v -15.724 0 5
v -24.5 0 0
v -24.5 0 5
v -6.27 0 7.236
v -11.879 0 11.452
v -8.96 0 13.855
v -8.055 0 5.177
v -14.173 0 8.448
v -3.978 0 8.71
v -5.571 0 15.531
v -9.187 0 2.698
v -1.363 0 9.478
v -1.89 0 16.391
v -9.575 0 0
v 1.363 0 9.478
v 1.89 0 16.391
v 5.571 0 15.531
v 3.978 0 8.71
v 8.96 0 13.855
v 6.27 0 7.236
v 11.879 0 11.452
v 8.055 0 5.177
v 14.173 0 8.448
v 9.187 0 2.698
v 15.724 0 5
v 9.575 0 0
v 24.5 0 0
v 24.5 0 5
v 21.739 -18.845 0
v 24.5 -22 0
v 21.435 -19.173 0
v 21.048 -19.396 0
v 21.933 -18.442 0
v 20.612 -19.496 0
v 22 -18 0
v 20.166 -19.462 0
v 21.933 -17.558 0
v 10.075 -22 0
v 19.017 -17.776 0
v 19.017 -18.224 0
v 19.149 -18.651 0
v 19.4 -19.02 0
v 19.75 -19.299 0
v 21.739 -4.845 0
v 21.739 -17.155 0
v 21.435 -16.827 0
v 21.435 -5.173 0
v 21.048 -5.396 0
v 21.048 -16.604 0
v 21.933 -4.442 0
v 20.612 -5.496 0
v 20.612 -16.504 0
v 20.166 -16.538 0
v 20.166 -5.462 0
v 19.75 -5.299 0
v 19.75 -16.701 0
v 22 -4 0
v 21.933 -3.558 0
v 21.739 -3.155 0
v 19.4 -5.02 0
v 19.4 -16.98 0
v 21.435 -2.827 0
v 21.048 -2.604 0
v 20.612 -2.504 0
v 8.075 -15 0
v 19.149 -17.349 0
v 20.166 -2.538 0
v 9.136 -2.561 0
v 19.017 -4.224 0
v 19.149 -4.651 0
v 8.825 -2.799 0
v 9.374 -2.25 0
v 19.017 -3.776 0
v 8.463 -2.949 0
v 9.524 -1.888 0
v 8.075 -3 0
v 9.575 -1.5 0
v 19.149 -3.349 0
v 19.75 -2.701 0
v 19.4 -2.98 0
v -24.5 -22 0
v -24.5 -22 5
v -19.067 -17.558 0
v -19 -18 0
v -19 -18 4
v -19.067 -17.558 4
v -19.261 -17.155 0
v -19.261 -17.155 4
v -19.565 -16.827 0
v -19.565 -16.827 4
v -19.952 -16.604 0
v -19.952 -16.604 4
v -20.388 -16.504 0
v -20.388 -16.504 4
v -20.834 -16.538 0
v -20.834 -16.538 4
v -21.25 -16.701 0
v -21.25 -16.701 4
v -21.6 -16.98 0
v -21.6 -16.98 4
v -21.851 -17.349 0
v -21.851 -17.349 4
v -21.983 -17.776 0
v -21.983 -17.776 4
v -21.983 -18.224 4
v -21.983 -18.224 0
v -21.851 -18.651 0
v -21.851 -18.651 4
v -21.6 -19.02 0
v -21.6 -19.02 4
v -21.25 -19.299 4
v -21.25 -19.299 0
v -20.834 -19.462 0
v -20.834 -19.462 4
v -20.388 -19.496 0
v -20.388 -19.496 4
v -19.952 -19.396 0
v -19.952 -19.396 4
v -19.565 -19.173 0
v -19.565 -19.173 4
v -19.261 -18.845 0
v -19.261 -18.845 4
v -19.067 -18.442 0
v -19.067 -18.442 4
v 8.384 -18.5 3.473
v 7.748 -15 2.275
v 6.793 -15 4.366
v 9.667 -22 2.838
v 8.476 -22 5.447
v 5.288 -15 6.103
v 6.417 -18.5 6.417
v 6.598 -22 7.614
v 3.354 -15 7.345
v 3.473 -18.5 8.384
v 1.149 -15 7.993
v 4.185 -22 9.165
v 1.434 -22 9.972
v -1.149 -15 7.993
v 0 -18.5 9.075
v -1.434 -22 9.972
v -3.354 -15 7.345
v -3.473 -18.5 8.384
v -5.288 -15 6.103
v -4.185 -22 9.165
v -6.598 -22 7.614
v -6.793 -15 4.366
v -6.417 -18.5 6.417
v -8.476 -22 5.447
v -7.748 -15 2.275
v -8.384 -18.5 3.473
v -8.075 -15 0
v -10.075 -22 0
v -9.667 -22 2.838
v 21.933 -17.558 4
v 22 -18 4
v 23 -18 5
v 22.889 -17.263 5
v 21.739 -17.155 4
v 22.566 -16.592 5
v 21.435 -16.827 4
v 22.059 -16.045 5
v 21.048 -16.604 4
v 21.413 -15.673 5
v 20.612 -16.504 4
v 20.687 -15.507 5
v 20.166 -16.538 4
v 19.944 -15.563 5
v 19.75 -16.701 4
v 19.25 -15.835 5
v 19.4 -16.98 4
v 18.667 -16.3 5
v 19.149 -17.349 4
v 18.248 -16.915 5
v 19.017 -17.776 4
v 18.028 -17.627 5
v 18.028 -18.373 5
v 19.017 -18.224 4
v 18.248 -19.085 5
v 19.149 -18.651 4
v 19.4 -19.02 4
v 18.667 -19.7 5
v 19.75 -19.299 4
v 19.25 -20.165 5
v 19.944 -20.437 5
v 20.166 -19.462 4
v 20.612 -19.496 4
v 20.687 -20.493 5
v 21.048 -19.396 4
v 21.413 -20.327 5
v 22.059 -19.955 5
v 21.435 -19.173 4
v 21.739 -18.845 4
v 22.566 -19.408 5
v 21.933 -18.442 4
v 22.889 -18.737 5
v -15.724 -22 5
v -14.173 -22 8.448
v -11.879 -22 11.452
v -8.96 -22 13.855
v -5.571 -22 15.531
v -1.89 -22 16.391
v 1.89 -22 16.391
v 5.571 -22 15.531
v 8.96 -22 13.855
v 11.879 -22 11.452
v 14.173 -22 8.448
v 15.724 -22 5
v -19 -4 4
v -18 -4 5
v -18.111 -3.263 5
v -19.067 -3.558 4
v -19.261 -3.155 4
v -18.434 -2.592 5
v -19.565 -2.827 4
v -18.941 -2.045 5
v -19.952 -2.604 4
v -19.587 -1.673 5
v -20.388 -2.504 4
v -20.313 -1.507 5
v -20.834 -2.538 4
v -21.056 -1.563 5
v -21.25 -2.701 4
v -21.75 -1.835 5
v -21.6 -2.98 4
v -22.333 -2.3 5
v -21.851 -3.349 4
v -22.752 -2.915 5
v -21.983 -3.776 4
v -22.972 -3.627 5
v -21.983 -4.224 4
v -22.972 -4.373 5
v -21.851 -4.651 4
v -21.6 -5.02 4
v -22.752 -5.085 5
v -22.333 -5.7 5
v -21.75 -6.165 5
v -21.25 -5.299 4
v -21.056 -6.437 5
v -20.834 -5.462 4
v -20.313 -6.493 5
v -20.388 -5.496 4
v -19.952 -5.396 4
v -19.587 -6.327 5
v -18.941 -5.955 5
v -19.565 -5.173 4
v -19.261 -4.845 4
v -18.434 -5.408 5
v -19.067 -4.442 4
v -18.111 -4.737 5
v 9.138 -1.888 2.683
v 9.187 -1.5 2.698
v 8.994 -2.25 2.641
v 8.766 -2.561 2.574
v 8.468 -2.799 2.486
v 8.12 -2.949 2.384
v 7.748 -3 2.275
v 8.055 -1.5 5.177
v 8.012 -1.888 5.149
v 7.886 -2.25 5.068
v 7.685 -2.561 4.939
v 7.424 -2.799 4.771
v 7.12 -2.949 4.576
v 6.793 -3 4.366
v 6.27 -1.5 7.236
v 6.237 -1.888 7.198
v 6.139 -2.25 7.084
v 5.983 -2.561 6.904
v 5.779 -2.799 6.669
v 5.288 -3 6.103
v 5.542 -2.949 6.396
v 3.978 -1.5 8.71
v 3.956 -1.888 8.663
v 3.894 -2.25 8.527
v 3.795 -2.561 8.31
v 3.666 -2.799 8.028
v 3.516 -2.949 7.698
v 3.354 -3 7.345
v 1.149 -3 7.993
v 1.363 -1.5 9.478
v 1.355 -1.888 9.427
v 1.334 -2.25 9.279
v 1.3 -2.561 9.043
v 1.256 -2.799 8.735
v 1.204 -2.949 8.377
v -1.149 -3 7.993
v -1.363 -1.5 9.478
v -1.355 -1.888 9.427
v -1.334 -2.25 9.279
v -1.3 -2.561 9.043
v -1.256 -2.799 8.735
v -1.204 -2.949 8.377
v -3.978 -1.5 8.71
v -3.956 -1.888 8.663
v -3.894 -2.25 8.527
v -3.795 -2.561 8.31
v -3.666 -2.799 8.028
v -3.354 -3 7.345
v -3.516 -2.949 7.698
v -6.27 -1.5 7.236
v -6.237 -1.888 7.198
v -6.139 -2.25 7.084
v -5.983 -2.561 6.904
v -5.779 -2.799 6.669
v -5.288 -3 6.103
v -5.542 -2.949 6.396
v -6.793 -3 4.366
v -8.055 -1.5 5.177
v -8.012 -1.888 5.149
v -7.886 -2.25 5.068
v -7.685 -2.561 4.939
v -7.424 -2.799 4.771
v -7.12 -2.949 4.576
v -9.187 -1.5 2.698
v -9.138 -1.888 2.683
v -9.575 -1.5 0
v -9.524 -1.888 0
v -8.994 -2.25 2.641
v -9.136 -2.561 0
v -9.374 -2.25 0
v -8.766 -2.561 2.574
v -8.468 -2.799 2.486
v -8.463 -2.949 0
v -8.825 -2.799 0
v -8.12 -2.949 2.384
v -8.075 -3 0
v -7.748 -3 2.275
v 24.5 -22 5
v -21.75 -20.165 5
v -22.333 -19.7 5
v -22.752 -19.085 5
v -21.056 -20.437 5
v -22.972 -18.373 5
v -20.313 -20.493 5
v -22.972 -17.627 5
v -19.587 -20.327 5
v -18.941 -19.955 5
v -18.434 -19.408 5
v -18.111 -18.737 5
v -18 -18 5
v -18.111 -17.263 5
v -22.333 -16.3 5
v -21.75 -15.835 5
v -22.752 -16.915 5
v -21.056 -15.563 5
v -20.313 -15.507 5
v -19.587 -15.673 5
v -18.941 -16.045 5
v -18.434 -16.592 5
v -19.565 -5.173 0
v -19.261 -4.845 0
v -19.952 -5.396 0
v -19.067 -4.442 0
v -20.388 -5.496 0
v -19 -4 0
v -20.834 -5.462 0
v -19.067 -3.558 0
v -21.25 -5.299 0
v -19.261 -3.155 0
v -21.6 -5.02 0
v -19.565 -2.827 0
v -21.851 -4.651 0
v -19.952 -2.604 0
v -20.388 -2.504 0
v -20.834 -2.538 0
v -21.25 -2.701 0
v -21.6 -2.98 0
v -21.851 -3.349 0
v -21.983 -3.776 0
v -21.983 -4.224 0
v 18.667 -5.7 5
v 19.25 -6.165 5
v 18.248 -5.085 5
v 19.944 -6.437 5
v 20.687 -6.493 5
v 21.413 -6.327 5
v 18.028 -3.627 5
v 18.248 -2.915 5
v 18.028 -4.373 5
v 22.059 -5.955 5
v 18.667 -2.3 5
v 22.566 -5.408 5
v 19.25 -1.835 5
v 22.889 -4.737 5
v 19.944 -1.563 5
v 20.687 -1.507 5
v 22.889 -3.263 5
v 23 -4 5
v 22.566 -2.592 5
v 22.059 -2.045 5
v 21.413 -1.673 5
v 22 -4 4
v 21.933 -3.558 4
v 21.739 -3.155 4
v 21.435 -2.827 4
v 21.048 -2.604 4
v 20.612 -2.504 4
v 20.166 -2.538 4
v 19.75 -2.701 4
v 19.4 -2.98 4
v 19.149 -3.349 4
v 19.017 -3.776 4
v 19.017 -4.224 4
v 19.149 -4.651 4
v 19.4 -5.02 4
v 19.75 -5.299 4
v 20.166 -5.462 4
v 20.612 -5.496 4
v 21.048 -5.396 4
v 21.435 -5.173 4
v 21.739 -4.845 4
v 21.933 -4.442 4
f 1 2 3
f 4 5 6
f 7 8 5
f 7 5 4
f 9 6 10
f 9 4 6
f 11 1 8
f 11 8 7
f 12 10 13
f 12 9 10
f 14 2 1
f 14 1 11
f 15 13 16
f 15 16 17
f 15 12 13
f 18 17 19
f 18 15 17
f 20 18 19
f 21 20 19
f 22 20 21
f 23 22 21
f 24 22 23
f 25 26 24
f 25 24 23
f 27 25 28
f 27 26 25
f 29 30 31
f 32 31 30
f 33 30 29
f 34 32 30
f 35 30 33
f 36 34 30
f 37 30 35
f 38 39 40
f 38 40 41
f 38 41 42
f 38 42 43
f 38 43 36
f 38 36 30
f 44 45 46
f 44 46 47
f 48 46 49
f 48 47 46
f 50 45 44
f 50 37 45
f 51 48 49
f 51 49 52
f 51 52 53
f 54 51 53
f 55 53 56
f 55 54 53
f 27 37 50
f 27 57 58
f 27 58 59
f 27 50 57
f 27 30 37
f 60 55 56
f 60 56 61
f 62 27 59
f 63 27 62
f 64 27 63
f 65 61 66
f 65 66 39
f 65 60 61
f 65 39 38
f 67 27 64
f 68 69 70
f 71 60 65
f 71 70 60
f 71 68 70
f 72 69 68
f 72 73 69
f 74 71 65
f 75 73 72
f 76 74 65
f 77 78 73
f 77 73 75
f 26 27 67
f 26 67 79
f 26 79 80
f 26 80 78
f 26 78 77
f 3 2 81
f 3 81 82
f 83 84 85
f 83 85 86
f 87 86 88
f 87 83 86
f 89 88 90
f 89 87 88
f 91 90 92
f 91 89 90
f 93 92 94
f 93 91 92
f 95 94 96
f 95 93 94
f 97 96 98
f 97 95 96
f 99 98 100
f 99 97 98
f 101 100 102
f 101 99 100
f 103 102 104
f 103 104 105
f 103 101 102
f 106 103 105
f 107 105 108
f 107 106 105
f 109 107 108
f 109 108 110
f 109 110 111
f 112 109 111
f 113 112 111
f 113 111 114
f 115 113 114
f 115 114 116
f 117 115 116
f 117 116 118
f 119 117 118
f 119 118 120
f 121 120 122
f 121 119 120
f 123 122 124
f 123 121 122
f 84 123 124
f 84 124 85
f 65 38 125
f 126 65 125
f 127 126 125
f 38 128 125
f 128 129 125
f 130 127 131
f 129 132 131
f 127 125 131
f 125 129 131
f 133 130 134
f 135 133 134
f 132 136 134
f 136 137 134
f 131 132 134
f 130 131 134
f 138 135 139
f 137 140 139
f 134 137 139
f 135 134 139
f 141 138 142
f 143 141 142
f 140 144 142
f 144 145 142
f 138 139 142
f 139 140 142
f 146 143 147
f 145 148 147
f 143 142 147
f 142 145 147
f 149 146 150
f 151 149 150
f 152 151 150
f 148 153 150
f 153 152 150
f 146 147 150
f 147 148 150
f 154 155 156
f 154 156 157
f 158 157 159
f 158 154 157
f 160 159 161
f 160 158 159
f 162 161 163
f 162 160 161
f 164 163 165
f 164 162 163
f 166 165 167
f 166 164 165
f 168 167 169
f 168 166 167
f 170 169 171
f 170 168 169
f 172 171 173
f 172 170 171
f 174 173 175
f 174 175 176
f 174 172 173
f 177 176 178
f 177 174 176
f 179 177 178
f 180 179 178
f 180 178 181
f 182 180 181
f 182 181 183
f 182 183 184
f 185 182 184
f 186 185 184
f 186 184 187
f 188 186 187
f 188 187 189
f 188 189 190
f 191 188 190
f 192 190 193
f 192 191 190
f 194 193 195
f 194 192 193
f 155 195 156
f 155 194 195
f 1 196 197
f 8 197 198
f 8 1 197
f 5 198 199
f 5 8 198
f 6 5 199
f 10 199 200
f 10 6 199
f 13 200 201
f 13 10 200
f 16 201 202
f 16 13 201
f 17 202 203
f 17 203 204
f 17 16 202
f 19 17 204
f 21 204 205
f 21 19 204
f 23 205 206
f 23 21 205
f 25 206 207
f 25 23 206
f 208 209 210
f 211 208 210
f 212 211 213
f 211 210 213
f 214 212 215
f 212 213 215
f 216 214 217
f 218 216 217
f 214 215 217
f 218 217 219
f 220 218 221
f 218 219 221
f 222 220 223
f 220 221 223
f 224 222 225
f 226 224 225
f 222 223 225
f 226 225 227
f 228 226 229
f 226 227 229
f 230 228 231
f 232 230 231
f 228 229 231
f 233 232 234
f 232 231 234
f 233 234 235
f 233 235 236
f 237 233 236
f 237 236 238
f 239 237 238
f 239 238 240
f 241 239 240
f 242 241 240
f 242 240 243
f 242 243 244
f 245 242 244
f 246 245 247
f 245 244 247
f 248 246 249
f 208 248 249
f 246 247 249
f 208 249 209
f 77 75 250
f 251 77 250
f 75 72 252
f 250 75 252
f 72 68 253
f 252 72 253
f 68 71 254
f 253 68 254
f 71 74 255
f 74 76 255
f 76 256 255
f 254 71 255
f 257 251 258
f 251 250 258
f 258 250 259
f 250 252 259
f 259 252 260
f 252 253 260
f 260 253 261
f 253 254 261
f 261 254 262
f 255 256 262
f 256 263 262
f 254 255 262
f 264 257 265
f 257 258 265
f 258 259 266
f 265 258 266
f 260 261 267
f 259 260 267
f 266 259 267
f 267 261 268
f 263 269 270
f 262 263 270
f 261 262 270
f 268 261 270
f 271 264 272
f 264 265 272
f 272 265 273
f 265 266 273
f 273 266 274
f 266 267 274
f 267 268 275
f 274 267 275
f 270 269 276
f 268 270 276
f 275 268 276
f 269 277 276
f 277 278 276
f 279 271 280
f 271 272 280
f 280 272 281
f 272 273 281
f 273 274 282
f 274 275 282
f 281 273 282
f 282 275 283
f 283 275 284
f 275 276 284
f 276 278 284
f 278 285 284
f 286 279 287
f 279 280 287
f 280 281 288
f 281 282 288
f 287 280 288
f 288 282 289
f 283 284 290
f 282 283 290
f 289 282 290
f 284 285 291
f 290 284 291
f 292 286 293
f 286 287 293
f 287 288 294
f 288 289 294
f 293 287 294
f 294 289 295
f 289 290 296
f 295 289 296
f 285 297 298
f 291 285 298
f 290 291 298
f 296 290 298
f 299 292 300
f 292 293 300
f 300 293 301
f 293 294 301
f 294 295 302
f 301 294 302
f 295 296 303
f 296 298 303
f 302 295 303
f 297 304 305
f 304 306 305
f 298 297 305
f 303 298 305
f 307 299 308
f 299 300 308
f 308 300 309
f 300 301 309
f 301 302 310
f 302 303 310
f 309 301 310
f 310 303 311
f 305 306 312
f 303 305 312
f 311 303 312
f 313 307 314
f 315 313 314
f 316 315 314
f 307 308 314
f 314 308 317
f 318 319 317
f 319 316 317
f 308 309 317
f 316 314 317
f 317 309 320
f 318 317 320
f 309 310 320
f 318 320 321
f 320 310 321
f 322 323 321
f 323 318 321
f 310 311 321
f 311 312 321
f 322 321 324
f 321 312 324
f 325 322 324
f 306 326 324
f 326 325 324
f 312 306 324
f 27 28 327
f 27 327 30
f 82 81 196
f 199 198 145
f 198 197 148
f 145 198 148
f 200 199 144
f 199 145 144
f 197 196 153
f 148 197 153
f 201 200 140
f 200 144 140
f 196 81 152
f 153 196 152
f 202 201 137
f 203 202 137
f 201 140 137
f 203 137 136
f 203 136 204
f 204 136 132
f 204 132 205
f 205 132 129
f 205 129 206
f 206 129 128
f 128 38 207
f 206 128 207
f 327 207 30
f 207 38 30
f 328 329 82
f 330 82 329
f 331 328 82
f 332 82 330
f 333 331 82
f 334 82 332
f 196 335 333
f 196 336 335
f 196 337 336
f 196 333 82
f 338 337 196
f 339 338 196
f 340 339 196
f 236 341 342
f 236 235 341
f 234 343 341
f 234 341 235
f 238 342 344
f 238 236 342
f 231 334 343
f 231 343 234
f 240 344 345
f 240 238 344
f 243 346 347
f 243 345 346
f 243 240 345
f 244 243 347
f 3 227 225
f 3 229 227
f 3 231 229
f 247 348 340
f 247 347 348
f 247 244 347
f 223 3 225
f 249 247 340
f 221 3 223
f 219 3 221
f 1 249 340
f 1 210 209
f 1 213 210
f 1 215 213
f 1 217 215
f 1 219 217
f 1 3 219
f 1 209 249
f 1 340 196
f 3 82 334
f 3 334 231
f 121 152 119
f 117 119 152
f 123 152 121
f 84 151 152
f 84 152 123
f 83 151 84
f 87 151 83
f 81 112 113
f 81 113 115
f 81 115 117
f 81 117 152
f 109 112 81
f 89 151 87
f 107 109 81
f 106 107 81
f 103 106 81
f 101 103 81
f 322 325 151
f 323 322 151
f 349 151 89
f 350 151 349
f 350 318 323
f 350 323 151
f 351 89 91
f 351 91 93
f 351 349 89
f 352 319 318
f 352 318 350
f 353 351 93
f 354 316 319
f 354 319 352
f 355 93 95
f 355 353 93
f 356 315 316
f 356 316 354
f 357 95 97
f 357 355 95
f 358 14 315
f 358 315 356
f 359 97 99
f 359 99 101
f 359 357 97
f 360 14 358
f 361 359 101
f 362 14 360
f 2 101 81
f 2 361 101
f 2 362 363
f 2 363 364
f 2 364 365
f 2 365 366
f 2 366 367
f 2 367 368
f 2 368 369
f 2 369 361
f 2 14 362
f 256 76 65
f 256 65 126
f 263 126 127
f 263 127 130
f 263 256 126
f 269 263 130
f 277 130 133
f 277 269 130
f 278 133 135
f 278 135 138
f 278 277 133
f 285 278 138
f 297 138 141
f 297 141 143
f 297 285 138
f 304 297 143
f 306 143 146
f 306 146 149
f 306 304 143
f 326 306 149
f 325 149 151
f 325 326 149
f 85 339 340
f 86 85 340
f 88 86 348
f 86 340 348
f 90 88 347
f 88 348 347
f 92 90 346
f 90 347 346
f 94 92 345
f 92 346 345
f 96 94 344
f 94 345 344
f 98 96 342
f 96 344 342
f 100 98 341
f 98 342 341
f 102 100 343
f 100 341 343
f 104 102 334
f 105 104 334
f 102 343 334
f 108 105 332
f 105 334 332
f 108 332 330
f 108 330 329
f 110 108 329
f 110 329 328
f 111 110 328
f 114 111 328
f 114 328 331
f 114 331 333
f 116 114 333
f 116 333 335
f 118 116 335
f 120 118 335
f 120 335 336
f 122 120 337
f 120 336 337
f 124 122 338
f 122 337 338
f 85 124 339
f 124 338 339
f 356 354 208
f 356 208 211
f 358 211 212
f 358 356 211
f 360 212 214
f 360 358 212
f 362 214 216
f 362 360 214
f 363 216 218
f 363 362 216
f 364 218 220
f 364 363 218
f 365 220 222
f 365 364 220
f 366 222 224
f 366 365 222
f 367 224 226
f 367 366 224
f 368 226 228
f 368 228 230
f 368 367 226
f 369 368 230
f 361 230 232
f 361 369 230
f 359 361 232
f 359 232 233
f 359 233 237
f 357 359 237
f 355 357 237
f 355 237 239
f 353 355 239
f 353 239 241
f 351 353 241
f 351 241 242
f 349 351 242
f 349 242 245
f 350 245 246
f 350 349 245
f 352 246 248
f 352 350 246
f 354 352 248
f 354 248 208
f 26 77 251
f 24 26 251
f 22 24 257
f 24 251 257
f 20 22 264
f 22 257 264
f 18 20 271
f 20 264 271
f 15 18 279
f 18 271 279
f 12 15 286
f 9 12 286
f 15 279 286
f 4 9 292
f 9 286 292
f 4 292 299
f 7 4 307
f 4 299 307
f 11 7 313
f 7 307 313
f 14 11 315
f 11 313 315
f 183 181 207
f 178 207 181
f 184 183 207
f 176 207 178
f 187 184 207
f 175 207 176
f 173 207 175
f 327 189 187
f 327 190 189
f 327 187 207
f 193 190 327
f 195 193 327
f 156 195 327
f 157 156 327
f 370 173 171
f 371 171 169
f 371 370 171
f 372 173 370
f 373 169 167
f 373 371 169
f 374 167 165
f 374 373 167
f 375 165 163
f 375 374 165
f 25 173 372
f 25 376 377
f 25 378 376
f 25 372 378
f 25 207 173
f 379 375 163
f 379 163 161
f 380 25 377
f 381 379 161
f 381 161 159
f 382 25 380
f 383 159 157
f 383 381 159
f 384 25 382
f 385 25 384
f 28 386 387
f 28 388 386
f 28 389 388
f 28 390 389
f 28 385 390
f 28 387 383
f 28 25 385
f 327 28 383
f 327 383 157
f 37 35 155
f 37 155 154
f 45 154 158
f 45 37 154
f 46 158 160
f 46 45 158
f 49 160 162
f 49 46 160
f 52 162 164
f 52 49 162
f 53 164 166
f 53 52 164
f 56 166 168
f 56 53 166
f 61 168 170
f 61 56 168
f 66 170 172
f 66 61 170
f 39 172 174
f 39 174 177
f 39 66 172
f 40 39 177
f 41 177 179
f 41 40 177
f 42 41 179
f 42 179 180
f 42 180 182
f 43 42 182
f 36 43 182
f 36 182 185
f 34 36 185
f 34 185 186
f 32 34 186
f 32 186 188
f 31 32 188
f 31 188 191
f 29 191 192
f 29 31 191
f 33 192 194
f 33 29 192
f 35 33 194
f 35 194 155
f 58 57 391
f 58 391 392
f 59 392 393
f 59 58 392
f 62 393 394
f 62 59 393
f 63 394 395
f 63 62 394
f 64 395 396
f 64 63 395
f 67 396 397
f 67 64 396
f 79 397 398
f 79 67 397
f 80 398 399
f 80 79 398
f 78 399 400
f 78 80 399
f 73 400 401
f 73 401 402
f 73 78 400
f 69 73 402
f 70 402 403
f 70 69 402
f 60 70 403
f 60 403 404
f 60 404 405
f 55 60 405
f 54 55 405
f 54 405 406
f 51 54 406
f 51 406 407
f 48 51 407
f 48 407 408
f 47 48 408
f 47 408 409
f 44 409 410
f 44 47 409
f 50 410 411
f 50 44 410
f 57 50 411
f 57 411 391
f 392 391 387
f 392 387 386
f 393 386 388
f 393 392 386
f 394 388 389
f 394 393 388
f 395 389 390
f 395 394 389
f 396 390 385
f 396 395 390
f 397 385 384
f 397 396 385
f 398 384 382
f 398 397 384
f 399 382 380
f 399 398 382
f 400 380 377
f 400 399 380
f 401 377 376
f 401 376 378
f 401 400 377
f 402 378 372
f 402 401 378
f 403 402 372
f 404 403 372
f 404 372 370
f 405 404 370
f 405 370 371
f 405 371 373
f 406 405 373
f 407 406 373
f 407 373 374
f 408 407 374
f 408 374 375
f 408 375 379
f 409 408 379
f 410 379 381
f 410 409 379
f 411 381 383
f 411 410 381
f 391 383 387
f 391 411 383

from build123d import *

# Parameters (mm, degrees)
BOSS_EXTRUDE1_DEPTH     = 22
BOSS_EXTRUDE3_START     = -5
BOSS_EXTRUDE3_OUTLINE_R = 1.5
BOSS_EXTRUDE3_DEPTH     = 5
CHAMFER2_SIZE           = 1
CHAMFER3_SIZE           = 7
CHAMFER3_SIZE2          = 2


# Read off the part's stored shape, not the designer's step: Boss-Extrude3
with BuildPart() as part:
    # Sketch1 → Boss-Extrude1 (new body)
    with BuildSketch(Plane(origin=(0, 0, 0), x_dir=(1, 0, 0), z_dir=(0, 1, 0))):
        with BuildLine():
            Line((0, -16.5), (0, -8.075))
            ThreePointArc((3.5438e-13, -8.075), (-5.709887258081245, -5.709887258081495), (-8.075, 1.03e-15))
            Line((-8.075, 0), (-16.5, 0))
            Line((-16.5, 0), (-24.5, -9.8e-16))
            Line((-24.5, -9.8e-16), (-24.5, -5.000000000000001))
            Line((-24.5, -5.000000000000001), (-15.724185193516389, -5.000000000000001))
            ThreePointArc((-15.724185193516387, -5), (-9.740379869388931, -13.318220601867306), (3.5527e-13, -16.5))
        make_face()
        with BuildLine():
            Line((24.5, -9.8e-16), (16.5, 0))
            Line((16.5, 0), (8.075, 0))
            ThreePointArc((8.075, 3.34e-15), (5.709887258081497, -5.709887258081244), (3.5438e-13, -8.075))
            Line((0, -8.075), (0, -16.5))
            ThreePointArc((3.5527e-13, -16.5), (9.74037986938922, -13.3182206018671), (15.724185193516387, -5.000000000000004))
            Line((15.724185193516389, -5.000000000000001), (24.5, -5.000000000000001))
            Line((24.5, -5.000000000000001), (24.5, -9.8e-16))
        make_face()
    extrude(amount=-BOSS_EXTRUDE1_DEPTH)

    # Boss-Extrude3 outline → Boss-Extrude3 (cut)
    with BuildSketch(Plane.XY.offset(5.000000000000001).offset(BOSS_EXTRUDE3_START)):
        with Locations((20.5, -18)):
            Circle(BOSS_EXTRUDE3_OUTLINE_R)
        with Locations((20.5, -4)):
            Circle(BOSS_EXTRUDE3_OUTLINE_R)
        with Locations((-20.5, -4)):
            Circle(BOSS_EXTRUDE3_OUTLINE_R)
        with Locations((-20.5, -18)):
            Circle(BOSS_EXTRUDE3_OUTLINE_R)
    extrude(amount=BOSS_EXTRUDE3_DEPTH, mode=Mode.SUBTRACT)

    # Chamfer2
    chamfer2_edges = [part.edges().sort_by_distance(p)[0] for p in [
        (-22, -18, 5.000000000000001),
        (19, -4, 5.000000000000001),
        (19, -18, 5.000000000000001),
        (-22, -4, 5.000000000000001),
    ]]
    chamfer(chamfer2_edges, length=CHAMFER2_SIZE)

    # Chamfer3
    chamfer3_edges = [part.edges().sort_by_distance(p)[0] for p in [
        (1.54e-15, -22, 8.075),
    ]]
    chamfer3_side = [part.faces().sort_by_distance(p)[0] for p in [
        (2.05e-15, -11, 8.075),
    ]]
    chamfer(chamfer3_edges, length=CHAMFER3_SIZE, length2=CHAMFER3_SIZE2, reference=chamfer3_side[0])

    # Sketch4 → Cut-Revolve1 (revolve, cut)
    with BuildSketch(Plane(origin=(0, 0, 0), x_dir=(-1, 0, -1.2e-16), z_dir=(1.2e-16, 0, -1))):
        with BuildLine():
            Line((-9.575, 0.4703111185771576), (-9.575, -1.4999999999999998))
            ThreePointArc((-9.575, -1.4999999999999998), (-7.014339828220178, -2.560660171779821), (-8.075, 0))
            Line((-8.075, 0), (-9.575, 0.4703111185771576))
        make_face()
    revolve(axis=Axis((4.3e-16, 1.8602118411515838, 0), (-1.7e-16, -1, 0)), mode=Mode.SUBTRACT)


solid = part.part
